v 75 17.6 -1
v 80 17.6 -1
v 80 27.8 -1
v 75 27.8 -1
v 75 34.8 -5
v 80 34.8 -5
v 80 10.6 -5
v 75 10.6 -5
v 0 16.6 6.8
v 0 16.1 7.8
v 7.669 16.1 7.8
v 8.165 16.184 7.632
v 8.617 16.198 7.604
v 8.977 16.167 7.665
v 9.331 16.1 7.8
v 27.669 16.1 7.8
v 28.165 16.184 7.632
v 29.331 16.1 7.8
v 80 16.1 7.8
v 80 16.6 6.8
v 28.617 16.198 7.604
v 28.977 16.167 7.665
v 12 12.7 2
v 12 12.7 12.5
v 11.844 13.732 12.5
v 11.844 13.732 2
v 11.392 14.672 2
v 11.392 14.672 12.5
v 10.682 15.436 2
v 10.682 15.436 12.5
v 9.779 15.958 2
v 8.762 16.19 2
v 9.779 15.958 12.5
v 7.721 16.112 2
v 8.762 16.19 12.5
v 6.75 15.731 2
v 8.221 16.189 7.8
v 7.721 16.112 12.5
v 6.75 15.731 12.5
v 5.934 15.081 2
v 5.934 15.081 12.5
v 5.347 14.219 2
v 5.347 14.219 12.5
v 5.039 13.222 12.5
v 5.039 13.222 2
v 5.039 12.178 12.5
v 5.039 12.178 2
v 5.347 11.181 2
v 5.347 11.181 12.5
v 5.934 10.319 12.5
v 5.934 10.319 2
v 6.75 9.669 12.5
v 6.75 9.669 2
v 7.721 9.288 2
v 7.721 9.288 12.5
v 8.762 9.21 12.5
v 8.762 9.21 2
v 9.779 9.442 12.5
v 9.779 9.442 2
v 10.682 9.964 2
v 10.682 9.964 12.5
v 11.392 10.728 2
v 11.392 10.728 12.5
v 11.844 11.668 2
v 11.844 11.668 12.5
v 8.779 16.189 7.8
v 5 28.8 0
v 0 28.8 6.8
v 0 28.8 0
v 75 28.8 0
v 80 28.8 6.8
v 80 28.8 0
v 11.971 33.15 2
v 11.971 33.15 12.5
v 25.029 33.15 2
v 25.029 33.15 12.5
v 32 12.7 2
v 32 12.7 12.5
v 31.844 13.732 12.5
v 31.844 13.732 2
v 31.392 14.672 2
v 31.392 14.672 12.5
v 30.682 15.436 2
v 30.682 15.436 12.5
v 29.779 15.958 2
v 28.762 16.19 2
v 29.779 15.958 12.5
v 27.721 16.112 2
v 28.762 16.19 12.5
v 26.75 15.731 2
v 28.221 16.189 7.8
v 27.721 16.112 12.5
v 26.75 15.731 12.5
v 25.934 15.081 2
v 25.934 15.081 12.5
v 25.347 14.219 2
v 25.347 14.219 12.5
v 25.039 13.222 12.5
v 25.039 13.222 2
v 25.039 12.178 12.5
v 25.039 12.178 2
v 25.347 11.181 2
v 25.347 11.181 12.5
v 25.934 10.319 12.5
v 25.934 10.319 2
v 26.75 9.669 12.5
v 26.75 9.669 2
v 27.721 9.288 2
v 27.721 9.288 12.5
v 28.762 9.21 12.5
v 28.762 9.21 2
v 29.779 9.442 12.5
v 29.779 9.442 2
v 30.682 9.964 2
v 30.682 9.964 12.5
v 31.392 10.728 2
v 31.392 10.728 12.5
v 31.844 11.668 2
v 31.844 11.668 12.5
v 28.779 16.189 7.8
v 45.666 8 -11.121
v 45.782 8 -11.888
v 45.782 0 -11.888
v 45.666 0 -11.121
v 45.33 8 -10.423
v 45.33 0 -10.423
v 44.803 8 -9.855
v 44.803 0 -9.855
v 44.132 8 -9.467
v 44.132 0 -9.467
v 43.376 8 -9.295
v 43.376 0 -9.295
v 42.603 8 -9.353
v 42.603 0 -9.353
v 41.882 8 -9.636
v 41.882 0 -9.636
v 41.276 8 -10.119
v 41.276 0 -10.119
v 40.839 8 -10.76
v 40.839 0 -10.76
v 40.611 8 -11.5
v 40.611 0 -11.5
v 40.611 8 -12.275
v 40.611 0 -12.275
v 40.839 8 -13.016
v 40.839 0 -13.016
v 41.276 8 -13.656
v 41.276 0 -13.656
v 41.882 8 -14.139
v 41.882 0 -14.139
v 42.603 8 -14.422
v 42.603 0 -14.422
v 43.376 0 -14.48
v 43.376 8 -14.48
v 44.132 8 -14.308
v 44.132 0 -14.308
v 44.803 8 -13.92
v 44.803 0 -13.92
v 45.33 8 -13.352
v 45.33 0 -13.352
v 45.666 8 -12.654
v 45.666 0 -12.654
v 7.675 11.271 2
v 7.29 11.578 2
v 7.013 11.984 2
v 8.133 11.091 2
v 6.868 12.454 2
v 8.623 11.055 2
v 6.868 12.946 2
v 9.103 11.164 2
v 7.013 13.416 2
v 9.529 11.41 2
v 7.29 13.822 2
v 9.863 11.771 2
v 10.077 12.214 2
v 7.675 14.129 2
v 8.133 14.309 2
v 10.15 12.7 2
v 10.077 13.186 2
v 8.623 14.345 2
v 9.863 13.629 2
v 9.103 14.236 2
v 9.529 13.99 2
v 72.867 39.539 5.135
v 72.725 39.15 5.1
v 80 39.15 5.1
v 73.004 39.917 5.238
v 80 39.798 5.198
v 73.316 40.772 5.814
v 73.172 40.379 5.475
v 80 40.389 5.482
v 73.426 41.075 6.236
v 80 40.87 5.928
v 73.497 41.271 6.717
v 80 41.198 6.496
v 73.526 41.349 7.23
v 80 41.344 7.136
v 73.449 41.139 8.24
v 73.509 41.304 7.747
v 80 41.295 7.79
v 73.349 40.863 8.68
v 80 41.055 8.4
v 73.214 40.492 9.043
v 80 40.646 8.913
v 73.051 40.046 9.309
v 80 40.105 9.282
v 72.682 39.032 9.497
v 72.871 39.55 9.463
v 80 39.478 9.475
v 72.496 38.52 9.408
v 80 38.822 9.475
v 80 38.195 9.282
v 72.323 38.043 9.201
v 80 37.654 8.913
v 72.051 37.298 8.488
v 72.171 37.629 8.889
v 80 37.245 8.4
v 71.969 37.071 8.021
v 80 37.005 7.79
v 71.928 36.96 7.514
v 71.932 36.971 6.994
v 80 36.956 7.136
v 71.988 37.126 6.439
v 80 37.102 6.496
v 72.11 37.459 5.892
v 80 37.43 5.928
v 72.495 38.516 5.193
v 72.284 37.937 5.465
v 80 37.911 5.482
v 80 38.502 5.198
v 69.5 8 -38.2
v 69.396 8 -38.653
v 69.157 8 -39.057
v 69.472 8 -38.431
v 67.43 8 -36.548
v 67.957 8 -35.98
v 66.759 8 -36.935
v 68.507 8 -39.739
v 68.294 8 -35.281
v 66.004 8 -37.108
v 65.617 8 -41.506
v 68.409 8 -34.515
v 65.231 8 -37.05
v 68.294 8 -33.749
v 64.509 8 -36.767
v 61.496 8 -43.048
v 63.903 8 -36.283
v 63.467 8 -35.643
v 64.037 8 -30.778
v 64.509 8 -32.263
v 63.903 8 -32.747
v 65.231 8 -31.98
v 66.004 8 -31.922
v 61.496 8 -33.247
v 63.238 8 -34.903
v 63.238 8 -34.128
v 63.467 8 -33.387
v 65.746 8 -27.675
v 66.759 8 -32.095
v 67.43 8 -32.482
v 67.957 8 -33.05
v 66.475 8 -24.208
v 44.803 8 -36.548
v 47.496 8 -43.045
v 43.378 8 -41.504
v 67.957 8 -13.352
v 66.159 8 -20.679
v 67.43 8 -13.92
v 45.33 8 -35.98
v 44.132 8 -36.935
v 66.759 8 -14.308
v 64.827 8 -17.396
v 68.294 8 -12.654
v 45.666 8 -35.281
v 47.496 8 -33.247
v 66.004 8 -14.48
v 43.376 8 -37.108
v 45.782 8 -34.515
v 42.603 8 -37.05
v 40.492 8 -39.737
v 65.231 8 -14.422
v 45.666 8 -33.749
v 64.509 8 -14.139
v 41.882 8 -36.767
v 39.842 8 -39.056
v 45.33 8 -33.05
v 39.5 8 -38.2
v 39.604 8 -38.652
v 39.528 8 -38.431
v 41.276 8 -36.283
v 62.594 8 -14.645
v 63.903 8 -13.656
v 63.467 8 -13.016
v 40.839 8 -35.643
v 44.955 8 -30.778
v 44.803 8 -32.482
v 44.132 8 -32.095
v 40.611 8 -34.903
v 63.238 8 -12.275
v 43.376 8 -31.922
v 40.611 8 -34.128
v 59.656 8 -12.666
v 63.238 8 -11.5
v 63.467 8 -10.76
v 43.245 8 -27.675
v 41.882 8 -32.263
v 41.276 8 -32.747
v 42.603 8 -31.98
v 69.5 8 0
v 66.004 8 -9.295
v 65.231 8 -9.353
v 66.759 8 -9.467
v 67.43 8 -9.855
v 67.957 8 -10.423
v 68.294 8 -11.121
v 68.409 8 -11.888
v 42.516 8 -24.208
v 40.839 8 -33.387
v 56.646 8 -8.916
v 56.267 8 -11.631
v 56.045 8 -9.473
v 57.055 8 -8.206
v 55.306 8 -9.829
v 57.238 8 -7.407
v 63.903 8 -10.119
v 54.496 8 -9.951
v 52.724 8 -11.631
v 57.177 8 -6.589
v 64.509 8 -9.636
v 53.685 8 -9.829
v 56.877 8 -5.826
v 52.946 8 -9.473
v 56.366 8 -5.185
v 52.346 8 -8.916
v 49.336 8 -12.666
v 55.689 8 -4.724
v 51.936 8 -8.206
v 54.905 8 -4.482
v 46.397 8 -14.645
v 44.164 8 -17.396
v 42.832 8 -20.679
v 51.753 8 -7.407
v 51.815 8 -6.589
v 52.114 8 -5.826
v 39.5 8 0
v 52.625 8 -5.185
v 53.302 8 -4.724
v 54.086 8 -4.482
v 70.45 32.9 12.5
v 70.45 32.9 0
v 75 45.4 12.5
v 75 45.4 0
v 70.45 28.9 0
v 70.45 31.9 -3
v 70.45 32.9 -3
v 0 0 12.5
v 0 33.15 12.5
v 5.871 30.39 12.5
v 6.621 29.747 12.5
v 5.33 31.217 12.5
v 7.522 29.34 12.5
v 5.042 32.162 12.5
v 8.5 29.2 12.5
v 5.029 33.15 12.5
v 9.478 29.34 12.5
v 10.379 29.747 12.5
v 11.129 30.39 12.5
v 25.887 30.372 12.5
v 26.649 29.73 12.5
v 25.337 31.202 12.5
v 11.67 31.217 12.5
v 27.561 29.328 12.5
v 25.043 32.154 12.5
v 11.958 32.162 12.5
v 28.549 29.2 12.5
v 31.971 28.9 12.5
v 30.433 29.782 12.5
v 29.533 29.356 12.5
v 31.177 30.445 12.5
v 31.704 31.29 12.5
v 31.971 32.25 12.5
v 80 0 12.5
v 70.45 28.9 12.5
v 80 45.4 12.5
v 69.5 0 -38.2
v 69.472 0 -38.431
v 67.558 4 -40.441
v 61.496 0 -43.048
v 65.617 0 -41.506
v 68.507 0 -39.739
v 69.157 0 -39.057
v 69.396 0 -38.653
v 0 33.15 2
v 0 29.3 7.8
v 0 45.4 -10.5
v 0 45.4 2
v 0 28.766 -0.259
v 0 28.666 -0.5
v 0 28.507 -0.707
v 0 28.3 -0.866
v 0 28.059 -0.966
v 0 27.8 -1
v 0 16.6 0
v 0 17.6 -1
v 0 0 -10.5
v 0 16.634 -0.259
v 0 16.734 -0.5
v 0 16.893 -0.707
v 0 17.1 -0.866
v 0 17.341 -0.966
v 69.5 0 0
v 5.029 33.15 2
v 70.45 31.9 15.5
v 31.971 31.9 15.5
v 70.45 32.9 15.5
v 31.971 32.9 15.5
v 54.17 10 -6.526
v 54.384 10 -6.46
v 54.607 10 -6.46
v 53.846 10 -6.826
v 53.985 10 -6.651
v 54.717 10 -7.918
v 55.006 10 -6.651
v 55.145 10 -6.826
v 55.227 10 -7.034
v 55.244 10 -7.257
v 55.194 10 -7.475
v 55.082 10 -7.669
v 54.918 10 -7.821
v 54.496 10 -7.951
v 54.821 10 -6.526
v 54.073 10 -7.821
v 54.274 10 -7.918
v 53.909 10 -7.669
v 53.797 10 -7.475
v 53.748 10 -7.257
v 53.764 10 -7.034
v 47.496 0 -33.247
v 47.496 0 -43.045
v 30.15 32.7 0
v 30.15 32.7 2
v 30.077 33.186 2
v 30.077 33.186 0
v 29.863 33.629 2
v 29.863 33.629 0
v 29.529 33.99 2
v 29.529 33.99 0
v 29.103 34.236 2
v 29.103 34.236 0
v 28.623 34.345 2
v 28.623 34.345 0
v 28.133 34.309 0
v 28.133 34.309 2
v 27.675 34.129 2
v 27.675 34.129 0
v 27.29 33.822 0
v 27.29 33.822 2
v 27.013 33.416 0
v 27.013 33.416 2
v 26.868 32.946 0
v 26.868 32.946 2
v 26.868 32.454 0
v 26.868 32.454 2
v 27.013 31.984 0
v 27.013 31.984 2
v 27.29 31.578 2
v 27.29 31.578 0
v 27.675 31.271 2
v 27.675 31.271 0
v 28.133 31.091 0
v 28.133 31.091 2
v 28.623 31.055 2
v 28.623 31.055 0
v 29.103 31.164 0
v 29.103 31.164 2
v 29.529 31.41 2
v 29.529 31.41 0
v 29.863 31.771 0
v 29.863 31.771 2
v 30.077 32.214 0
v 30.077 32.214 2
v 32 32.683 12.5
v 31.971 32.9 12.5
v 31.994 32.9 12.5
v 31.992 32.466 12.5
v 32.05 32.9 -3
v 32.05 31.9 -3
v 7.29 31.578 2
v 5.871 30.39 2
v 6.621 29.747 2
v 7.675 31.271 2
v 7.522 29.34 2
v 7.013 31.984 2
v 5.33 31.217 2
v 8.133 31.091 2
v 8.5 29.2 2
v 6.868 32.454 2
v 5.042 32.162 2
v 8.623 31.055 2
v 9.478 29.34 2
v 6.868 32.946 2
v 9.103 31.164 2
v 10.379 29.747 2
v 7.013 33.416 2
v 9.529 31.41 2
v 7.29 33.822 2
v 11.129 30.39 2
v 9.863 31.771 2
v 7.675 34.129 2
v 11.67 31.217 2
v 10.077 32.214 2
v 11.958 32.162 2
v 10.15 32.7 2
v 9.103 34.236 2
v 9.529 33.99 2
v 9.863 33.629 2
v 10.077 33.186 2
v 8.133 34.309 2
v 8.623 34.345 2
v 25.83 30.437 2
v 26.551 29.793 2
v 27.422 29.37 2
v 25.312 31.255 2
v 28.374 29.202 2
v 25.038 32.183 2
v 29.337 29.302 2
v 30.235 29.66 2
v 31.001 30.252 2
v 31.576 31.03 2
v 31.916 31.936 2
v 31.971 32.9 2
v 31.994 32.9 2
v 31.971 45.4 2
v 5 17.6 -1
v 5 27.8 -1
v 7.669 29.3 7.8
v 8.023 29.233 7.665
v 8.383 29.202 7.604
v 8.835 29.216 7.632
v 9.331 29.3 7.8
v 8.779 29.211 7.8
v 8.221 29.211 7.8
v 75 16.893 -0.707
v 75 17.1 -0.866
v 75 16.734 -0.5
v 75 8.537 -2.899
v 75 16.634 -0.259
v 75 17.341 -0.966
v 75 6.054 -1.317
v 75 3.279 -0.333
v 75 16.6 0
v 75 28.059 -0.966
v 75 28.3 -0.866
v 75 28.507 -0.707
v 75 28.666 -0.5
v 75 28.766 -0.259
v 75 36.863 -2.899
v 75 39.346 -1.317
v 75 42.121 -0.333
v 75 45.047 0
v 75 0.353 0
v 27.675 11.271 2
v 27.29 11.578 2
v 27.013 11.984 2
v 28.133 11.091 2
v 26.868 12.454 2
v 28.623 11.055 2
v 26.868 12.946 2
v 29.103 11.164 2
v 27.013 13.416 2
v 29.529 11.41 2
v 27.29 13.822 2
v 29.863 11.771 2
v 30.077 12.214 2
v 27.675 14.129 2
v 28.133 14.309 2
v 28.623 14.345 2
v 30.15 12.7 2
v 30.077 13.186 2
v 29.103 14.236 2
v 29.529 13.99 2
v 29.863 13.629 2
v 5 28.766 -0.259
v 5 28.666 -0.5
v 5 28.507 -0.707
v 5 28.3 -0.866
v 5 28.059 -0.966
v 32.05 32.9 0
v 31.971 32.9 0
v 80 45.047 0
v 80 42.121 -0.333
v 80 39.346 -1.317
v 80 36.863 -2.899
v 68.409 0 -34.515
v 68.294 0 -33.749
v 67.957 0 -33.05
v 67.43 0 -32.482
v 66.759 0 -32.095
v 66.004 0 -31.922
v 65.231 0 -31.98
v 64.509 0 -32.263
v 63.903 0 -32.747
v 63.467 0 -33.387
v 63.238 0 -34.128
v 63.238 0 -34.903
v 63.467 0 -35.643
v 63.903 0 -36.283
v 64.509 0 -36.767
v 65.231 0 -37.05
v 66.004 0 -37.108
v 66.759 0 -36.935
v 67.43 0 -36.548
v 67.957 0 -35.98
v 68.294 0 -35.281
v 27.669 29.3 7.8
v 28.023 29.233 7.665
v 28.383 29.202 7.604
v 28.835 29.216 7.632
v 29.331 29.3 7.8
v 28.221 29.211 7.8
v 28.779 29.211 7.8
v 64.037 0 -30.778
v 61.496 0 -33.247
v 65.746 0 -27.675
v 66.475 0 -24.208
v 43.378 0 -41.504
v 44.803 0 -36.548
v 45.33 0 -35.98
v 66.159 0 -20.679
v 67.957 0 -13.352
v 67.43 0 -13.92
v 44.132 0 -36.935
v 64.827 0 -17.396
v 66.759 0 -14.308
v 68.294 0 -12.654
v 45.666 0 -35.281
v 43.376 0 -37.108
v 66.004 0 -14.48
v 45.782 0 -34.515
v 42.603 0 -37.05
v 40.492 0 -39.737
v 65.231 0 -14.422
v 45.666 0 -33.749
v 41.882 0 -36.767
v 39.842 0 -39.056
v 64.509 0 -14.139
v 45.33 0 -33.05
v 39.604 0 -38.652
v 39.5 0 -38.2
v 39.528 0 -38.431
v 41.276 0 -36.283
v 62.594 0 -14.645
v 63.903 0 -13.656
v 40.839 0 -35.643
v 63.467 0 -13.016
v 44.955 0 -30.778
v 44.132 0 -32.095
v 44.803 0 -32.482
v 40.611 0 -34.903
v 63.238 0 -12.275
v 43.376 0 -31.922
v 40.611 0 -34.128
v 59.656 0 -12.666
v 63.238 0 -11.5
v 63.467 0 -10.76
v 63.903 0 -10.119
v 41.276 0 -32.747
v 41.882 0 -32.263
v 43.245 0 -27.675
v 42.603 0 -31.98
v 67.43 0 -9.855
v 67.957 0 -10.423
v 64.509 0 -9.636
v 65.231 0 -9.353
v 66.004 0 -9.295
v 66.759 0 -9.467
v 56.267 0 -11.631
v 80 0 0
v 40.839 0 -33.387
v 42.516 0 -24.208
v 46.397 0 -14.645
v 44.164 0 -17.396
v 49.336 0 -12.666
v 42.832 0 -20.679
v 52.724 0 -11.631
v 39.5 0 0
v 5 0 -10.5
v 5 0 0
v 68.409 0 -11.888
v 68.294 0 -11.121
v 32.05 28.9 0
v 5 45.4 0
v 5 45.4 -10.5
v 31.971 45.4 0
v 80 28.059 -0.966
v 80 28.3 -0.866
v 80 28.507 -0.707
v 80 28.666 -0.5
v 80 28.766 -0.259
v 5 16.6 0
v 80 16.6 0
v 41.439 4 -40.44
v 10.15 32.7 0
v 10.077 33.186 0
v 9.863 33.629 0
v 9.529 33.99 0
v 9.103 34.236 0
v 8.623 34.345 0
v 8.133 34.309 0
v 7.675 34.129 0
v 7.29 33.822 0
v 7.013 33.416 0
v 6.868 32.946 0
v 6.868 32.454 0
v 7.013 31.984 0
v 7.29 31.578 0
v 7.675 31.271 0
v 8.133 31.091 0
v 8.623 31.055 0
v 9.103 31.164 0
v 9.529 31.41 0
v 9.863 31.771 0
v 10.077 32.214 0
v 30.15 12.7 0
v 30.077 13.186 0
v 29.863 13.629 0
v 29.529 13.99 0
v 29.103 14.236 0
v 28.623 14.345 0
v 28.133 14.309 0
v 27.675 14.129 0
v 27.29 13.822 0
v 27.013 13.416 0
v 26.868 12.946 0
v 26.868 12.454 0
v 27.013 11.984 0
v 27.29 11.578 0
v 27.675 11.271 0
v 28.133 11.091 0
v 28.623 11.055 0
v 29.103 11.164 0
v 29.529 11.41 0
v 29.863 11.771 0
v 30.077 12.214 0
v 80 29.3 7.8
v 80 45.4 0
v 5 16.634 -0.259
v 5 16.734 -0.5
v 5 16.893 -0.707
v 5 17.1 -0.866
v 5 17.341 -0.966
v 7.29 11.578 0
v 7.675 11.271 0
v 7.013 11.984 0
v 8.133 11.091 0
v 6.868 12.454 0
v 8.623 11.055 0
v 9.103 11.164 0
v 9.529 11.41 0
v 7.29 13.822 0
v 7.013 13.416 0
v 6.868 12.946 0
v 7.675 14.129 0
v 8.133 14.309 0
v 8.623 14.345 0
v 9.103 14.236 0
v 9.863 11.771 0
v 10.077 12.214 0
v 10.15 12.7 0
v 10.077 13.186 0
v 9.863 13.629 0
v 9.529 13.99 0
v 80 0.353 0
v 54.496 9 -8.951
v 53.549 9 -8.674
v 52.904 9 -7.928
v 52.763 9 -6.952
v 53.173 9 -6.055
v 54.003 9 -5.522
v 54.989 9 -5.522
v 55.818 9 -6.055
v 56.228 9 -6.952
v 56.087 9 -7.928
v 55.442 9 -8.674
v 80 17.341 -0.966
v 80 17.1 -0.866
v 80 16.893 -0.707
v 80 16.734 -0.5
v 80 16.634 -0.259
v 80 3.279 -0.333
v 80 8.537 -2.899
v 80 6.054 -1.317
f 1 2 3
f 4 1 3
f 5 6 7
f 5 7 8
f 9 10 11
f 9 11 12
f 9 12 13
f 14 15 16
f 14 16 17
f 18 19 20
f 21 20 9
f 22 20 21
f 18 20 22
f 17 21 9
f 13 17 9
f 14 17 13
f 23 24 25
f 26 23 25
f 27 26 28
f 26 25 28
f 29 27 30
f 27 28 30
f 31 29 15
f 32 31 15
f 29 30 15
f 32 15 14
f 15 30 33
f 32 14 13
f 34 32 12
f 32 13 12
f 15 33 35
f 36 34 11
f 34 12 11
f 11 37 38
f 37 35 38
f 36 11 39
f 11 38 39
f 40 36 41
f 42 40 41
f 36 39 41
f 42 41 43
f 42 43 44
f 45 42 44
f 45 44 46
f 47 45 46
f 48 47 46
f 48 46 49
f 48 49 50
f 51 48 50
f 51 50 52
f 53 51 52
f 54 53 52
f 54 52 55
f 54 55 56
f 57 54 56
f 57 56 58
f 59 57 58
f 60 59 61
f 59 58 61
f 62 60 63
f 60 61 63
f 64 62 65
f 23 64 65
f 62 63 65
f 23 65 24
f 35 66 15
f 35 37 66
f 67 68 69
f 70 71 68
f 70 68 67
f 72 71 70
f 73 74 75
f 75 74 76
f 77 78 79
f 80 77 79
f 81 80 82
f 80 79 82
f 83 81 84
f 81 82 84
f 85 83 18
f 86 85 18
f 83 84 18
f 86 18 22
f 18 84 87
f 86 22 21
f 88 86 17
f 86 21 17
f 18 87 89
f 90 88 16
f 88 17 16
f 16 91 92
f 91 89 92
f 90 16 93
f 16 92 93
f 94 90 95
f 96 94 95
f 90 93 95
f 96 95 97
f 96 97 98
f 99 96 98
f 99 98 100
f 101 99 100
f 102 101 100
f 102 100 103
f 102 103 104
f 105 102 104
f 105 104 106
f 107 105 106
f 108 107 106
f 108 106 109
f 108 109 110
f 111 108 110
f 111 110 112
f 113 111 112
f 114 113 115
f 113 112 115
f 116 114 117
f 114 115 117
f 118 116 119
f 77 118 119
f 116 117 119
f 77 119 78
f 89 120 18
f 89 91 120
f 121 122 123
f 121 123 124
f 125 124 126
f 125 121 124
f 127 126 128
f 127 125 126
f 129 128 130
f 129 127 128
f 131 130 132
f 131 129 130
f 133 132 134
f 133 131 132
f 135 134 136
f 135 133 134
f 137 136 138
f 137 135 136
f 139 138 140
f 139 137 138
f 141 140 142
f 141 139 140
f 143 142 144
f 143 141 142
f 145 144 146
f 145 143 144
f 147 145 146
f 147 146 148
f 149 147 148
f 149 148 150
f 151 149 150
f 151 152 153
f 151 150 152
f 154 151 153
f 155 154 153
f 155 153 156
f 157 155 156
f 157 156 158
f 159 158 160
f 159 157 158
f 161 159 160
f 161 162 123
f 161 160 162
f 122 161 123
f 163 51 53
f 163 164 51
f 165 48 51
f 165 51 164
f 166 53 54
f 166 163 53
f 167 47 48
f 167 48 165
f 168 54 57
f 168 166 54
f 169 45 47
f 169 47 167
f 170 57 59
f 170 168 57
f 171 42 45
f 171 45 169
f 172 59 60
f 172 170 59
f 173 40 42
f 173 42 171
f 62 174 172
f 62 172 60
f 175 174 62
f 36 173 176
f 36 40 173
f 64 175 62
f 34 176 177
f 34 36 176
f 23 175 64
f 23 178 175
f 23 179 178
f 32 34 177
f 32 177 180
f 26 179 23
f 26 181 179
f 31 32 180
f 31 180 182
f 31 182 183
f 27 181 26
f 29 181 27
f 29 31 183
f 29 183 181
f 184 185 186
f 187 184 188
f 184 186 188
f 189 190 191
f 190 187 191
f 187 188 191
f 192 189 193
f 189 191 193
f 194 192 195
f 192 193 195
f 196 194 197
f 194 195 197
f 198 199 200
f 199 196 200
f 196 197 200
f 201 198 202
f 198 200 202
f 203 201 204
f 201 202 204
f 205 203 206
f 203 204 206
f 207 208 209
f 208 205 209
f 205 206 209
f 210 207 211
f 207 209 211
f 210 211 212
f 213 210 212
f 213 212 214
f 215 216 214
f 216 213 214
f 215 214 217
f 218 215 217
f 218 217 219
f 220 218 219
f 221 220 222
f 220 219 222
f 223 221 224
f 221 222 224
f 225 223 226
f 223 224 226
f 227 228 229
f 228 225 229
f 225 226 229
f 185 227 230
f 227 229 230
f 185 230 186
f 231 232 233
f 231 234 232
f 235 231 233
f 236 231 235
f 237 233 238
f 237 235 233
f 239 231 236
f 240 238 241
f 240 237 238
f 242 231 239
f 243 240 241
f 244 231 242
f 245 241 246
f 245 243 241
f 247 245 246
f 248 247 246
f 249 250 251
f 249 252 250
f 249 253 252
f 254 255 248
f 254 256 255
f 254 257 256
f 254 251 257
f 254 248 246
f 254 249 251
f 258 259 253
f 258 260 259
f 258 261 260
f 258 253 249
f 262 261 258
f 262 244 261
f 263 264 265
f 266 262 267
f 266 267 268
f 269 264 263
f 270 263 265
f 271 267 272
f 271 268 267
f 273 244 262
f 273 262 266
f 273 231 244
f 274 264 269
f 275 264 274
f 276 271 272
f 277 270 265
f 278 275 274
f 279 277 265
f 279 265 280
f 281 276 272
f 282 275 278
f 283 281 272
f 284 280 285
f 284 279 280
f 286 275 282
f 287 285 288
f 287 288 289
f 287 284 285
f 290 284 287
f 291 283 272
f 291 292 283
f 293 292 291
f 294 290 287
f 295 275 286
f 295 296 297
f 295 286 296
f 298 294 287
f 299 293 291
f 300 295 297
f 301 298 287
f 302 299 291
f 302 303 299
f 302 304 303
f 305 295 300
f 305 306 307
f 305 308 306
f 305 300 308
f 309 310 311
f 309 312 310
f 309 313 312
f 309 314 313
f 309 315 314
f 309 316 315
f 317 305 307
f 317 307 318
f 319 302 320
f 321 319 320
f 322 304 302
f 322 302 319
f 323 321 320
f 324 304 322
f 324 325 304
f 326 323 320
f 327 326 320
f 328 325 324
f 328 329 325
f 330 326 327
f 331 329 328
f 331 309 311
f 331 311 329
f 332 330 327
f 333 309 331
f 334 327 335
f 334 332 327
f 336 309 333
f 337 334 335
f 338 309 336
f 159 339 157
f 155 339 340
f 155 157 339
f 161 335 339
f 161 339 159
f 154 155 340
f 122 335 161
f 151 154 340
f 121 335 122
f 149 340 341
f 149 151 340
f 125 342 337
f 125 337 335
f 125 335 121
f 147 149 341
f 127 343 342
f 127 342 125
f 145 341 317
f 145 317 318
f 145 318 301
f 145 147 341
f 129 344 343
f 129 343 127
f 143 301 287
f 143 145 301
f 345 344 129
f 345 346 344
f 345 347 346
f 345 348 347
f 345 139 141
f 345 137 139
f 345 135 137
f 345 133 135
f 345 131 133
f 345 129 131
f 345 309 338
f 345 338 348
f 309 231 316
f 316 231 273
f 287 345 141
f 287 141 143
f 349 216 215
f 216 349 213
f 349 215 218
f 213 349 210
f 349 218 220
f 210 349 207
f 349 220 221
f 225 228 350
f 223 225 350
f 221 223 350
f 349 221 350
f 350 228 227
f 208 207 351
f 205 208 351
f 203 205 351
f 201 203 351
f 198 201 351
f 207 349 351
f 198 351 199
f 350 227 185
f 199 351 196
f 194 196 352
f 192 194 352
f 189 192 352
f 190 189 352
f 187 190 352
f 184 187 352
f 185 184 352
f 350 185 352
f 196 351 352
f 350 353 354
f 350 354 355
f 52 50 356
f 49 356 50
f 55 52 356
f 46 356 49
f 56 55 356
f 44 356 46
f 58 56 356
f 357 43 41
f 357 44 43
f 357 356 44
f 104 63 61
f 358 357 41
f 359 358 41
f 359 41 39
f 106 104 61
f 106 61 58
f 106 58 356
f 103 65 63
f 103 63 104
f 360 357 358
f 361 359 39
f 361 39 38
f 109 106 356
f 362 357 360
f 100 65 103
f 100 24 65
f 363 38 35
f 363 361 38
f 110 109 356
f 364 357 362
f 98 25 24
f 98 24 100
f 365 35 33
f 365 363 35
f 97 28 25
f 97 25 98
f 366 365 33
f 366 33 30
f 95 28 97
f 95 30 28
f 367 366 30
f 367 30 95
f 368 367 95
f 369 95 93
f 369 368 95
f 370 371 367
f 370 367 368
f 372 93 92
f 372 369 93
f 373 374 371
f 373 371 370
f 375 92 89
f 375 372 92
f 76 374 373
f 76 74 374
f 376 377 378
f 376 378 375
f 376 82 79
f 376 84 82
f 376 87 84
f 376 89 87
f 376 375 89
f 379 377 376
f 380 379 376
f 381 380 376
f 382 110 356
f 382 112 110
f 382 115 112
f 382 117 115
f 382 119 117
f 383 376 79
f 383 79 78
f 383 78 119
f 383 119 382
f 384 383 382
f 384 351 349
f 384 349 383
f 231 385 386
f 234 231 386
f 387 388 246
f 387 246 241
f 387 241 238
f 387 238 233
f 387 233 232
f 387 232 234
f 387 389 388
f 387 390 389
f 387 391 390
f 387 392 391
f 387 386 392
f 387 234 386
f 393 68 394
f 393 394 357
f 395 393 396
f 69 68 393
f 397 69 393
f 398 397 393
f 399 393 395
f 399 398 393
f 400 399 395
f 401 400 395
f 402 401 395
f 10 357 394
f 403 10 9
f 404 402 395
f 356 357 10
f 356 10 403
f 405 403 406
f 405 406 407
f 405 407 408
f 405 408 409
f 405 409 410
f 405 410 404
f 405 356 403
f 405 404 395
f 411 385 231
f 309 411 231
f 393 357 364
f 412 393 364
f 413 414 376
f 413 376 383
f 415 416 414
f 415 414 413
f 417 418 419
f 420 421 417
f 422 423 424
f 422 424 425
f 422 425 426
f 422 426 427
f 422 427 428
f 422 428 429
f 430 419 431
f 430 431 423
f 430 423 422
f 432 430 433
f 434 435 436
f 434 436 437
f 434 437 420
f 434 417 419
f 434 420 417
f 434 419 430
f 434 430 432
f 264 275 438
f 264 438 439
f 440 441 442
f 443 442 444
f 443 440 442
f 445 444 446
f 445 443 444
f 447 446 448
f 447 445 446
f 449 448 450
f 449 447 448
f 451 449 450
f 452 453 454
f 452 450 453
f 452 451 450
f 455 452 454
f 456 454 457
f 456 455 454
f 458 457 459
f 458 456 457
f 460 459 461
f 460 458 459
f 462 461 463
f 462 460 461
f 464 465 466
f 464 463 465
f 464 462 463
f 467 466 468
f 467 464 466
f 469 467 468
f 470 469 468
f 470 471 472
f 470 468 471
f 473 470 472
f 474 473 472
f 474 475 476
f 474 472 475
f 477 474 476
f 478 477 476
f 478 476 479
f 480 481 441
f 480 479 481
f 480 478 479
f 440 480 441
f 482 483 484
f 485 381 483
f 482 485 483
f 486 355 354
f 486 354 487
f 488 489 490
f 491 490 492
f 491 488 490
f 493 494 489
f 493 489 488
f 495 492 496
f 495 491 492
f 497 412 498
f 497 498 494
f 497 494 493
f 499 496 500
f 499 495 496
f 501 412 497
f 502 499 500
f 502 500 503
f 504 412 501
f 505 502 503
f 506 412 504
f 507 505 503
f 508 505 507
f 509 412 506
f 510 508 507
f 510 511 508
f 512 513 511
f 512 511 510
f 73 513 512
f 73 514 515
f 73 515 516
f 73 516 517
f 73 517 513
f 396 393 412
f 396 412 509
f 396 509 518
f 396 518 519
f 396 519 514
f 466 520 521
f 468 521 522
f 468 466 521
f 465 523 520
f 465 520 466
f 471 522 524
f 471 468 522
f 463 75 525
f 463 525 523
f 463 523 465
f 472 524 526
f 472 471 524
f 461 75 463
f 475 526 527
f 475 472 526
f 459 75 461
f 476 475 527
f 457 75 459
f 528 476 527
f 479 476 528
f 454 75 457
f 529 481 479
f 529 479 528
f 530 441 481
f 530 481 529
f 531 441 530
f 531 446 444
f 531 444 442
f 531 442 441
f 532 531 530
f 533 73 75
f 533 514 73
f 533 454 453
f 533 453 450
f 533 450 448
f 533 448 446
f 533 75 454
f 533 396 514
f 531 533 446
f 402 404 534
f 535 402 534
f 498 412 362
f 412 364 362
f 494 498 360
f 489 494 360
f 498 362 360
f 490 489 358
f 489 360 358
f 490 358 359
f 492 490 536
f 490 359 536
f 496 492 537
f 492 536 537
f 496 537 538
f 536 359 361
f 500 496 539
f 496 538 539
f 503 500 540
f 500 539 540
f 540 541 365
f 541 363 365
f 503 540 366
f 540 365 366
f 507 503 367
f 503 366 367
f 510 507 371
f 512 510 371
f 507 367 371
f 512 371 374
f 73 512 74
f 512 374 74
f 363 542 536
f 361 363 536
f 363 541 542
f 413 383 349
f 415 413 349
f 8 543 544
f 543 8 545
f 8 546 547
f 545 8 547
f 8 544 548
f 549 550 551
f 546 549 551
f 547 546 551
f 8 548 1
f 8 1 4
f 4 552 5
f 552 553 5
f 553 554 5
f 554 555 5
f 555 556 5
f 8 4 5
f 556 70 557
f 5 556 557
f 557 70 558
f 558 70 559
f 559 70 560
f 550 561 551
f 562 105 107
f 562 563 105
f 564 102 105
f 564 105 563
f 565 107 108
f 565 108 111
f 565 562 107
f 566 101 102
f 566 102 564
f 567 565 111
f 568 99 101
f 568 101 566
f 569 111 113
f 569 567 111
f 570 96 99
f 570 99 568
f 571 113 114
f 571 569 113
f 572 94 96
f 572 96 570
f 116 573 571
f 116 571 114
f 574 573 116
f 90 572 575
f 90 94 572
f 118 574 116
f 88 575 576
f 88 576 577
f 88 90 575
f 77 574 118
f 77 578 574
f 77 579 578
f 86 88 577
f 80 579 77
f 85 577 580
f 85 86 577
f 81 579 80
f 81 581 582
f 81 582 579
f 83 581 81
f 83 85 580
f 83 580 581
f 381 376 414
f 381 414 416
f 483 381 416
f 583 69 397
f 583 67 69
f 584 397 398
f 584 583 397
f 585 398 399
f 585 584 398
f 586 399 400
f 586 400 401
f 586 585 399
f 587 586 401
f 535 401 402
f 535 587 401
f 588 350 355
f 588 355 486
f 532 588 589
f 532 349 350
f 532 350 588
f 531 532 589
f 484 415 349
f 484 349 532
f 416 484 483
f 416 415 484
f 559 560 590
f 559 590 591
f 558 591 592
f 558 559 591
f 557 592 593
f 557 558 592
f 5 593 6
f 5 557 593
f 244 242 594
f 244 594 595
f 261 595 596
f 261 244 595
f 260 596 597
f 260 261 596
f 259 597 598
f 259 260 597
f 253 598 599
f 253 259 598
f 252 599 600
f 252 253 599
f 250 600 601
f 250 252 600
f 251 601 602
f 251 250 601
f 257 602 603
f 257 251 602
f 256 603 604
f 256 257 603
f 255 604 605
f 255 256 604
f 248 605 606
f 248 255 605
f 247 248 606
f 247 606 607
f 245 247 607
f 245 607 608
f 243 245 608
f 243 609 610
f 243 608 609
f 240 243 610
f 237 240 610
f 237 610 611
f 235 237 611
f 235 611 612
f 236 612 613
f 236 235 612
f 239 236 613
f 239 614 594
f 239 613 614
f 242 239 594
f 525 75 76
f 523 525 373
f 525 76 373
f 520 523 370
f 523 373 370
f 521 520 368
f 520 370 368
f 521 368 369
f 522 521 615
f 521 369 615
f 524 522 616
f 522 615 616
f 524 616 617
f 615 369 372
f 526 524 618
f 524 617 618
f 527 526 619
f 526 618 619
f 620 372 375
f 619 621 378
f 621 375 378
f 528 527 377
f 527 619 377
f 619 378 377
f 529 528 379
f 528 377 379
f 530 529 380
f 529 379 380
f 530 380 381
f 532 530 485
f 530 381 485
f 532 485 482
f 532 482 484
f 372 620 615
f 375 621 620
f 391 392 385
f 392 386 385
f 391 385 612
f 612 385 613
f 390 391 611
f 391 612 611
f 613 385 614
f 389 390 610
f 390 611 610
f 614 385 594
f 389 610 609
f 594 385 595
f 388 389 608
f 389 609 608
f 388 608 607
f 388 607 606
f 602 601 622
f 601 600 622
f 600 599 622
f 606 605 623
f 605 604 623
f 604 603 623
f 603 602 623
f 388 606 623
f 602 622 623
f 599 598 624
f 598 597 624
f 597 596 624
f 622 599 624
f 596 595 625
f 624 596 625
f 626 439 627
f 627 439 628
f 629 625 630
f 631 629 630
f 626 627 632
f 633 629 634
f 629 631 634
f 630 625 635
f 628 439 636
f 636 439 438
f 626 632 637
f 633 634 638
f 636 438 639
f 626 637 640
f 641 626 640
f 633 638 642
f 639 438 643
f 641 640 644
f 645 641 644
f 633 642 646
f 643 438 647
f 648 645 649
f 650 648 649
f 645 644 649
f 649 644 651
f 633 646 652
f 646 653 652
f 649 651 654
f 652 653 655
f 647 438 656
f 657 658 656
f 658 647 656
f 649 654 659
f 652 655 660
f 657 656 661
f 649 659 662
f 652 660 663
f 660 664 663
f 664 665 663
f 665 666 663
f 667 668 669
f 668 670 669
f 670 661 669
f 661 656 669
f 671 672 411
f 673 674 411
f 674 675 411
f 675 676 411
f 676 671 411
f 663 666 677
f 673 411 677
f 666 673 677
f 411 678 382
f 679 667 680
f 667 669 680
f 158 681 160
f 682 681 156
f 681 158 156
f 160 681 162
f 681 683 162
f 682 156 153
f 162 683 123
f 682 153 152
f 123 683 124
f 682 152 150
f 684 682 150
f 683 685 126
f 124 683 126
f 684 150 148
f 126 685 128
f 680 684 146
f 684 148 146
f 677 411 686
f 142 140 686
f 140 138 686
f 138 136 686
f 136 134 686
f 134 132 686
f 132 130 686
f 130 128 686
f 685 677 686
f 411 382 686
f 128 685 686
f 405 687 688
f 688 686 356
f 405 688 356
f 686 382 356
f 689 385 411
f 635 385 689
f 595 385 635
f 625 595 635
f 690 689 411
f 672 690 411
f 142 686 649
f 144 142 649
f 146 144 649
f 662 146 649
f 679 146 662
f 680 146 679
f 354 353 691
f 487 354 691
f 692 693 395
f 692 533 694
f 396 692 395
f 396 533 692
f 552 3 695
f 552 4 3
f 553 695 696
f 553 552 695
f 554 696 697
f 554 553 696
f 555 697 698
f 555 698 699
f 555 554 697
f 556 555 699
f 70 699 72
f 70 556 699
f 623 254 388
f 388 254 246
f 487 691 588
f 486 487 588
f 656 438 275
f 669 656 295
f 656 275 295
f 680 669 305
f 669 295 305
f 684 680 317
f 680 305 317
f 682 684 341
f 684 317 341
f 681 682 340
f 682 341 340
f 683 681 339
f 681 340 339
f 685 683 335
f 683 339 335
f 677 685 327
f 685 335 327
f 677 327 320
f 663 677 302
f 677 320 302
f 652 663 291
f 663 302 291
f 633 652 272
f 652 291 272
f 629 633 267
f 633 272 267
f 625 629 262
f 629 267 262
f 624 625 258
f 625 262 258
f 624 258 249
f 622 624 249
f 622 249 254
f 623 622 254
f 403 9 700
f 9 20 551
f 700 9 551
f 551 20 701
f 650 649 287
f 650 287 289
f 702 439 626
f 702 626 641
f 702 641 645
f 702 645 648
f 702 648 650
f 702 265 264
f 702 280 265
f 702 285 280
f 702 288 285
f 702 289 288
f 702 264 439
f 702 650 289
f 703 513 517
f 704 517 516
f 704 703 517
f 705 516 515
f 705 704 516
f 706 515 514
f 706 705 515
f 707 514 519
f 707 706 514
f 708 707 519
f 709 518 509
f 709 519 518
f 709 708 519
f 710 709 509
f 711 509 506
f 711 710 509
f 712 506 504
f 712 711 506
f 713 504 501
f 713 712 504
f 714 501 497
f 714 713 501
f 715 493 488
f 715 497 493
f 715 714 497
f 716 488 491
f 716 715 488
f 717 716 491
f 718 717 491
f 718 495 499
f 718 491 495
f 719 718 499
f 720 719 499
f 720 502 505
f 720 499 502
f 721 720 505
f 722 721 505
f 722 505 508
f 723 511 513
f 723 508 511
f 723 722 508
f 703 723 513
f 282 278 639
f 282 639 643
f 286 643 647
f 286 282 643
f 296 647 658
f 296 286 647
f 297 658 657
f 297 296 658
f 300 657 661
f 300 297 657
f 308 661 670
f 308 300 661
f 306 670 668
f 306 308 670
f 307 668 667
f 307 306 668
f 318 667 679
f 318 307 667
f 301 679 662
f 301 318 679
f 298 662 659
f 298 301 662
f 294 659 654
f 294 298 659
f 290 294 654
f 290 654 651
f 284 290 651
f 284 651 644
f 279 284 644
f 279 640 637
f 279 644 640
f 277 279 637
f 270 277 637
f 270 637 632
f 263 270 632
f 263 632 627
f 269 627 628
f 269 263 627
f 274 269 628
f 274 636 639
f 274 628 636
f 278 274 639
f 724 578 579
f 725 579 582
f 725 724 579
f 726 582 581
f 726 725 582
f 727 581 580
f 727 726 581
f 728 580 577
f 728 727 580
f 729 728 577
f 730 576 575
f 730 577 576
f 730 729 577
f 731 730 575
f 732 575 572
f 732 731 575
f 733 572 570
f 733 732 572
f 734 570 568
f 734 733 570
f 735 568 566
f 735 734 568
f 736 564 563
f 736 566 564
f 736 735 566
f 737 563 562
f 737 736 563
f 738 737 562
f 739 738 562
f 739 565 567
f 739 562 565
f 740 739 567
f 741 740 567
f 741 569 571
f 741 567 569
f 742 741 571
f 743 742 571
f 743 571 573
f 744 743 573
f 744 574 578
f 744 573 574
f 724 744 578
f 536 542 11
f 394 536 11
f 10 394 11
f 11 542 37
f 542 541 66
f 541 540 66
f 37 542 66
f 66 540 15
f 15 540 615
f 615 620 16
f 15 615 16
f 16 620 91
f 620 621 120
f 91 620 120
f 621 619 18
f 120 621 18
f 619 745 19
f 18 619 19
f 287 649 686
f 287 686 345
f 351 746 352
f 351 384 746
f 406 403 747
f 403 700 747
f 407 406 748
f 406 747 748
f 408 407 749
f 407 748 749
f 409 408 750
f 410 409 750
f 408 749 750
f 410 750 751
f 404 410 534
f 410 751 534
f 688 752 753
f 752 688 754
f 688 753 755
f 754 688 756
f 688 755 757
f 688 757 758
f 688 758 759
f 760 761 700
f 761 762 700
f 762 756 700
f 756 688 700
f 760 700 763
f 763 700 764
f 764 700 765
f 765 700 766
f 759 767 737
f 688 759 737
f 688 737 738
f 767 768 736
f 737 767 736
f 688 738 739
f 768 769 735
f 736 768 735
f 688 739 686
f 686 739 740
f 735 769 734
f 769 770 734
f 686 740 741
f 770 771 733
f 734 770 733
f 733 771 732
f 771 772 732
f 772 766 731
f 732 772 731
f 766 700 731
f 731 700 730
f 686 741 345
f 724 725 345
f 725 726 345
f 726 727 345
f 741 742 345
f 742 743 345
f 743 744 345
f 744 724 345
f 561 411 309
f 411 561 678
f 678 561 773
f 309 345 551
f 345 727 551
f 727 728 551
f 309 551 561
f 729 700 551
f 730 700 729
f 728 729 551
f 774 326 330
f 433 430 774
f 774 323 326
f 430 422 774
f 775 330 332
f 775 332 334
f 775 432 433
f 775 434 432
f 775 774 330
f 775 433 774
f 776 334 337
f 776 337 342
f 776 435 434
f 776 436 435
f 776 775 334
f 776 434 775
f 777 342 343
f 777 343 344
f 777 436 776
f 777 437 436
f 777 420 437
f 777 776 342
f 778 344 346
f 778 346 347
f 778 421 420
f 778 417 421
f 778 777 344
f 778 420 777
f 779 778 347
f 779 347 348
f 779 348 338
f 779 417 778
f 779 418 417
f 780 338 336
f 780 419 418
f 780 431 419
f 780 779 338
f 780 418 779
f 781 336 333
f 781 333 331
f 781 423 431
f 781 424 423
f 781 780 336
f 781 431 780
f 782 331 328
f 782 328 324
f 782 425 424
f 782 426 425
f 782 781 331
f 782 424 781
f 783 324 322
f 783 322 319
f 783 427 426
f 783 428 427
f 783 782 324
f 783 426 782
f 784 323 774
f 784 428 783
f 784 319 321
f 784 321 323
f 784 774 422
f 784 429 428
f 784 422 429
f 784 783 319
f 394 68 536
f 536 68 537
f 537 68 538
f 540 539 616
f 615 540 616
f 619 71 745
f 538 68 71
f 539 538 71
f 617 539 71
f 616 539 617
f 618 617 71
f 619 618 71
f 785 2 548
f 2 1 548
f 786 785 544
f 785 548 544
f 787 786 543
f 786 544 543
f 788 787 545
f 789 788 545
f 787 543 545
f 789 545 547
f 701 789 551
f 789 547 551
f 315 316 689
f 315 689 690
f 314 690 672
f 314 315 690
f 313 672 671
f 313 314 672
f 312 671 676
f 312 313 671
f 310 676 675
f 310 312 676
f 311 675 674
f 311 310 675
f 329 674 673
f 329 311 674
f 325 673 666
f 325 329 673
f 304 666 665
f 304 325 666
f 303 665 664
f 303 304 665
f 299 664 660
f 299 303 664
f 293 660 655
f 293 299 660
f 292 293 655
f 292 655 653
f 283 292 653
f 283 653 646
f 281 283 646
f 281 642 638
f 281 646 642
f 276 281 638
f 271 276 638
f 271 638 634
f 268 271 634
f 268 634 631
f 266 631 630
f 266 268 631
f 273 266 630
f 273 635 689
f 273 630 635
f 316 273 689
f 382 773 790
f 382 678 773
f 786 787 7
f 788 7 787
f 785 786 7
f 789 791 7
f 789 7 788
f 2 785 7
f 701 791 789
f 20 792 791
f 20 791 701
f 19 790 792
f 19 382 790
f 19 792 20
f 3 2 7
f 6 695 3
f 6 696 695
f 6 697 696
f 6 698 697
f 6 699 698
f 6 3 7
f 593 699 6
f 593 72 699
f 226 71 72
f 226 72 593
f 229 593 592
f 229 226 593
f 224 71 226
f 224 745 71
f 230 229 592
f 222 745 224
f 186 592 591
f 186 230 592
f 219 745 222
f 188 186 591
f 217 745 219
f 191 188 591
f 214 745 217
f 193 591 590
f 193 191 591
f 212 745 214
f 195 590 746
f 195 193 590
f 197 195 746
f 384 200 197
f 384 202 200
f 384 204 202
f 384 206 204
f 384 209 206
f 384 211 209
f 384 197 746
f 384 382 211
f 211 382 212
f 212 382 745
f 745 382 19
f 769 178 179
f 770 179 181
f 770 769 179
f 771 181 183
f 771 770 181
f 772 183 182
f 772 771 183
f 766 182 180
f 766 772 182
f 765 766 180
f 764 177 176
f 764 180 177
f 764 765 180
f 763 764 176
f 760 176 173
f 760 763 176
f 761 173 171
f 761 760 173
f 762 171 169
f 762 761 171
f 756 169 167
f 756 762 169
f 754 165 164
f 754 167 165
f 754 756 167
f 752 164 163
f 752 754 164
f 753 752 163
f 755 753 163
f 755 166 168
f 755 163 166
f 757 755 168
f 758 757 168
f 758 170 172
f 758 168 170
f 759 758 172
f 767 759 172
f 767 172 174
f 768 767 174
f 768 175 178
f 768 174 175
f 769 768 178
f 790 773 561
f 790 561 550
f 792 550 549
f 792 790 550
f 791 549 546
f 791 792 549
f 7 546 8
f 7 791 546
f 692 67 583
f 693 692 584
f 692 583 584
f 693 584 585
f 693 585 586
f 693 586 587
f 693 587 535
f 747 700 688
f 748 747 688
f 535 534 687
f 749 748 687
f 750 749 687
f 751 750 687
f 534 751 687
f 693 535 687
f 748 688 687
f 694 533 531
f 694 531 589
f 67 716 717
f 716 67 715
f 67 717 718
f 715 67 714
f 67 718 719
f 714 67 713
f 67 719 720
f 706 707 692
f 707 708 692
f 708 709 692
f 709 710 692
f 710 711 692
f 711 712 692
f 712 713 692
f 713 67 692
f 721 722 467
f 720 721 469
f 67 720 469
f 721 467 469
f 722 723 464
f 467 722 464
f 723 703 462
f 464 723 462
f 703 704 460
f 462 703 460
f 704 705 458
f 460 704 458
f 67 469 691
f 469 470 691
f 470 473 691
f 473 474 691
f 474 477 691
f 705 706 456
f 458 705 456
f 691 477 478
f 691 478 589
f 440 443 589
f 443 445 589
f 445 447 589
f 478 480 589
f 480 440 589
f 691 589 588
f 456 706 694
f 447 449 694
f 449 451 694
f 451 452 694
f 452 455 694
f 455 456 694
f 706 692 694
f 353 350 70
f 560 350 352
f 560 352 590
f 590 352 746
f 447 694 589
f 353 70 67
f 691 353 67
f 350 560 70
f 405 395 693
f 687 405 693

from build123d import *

# Parameters (mm, degrees)
SKETCH1_W               = 80
SKETCH1_H               = 45.4
SKETCH1_R               = 1.65
BOSS_EXTRUDE1_DEPTH     = 12.5
SKETCH2_W               = 5
SKETCH2_H               = 45.4
BOSS_EXTRUDE2_DEPTH     = 10.5
CUT_EXTRUDE1_DEPTH      = 7.8
CUT_EXTRUDE1_DEPTH_BACK = 93.830005925
SKETCH3_W               = 80
SKETCH3_H               = 12.2
SKETCH4_W               = 30
SKETCH4_H               = 8
BOSS_EXTRUDE3_DEPTH     = 44.2
SKETCH5_R               = 12
CUT_EXTRUDE2_DEPTH      = 45
CUT_EXTRUDE3_DEPTH      = 96.828388278
CUT_EXTRUDE3_DEPTH_BACK = 96.828388278
SKETCH6_R               = 2.6
FILLET1_SIZE            = 6
FILLET1_SIZE_2          = 15
SKETCH8_R               = 3.5
CUT_EXTRUDE5_DEPTH      = 10.5
SKETCH12_W              = 45
SKETCH12_H              = 12.25
CUT_EXTRUDE8_DEPTH      = 10.5
SKETCH13_W              = 14
SKETCH13_H              = 23.274164218
CUT_EXTRUDE10_DEPTH     = 10
SKETCH15_R              = 2.75
BOSS_EXTRUDE6_DEPTH     = 2
SKETCH16_W              = 43.029059925
SKETCH16_H              = 12.5
CUT_EXTRUDE11_DEPTH     = 12.5
CHAMFER2_SIZE2          = 12.5
CHAMFER2_SIZE           = 4.549627928
SKETCH17_R              = 2.2
CUT_EXTRUDE12_DEPTH     = 10
CUT_EXTRUDE13_DEPTH     = 102.559280367
SKETCH19_W              = 5
SKETCH19_H              = 24.2
BOSS_EXTRUDE7_DEPTH     = 5
SKETCH20_W              = 1
SKETCH20_H              = 12.2
CUT_EXTRUDE14_DEPTH     = 102.559280367
SKETCH21_W              = 5
SKETCH21_H              = 9.5
BOSS_EXTRUDE8_DEPTH     = 12.2
FILLET2_R               = 1
FILLET3_R               = 13
CHAMFER1_SIZE           = 2
SKETCH22_W              = 38.479431997
SKETCH22_H              = 1
BOSS_EXTRUDE9_DEPTH     = 3
SKETCH23_W              = 38.4
SKETCH23_H              = 1
BOSS_EXTRUDE10_DEPTH    = 3
CHAMFER3_SIZE           = 3


# Some blends are built 0.0001 mm under size
with BuildPart() as part:
    # Sketch1 → Boss-Extrude1 (new body)
    with BuildSketch(Plane.XY):
        with Locations((40, 22.7)):
            Rectangle(SKETCH1_W, SKETCH1_H)
        with Locations((8.499989197, 32.7)):
            Circle(SKETCH1_R, mode=Mode.SUBTRACT)
        with Locations((28.499989197, 32.7)):
            Circle(SKETCH1_R, mode=Mode.SUBTRACT)
        with Locations((28.499989197, 12.7)):
            Circle(SKETCH1_R, mode=Mode.SUBTRACT)
        with Locations((8.499989197, 12.7)):
            Circle(SKETCH1_R, mode=Mode.SUBTRACT)
    extrude(amount=BOSS_EXTRUDE1_DEPTH)

    # Sketch2 → Boss-Extrude2 (add)
    with BuildSketch(Plane(origin=(0, 0, 0), x_dir=(-1, 0, 0), z_dir=(0, 0, -1))):
        with Locations((-2.5, 22.7)):
            Rectangle(SKETCH2_W, SKETCH2_H)
    extrude(amount=BOSS_EXTRUDE2_DEPTH)

    # Sketch3 → Cut-Extrude1 (cut, two sides: drawn at the far end of the back side and taken through both)
    with BuildSketch(Plane.XY.offset(-CUT_EXTRUDE1_DEPTH_BACK)):
        with Locations((40, 22.7)):
            Rectangle(SKETCH3_W, SKETCH3_H)
    extrude(amount=CUT_EXTRUDE1_DEPTH + CUT_EXTRUDE1_DEPTH_BACK, mode=Mode.SUBTRACT)

    # Sketch4 → Boss-Extrude3 (add)
    with BuildSketch(Plane(origin=(0, 0, 0), x_dir=(-1, 0, 0), z_dir=(0, 0, -1))):
        with Locations((-54.5, 4)):
            Rectangle(SKETCH4_W, SKETCH4_H)
    extrude(amount=BOSS_EXTRUDE3_DEPTH)

    # Sketch5 → Cut-Extrude2 (cut)
    with BuildSketch(Plane(origin=(0, 8, 0), x_dir=(1, 0, 0), z_dir=(0, 1, 0))):
        with Locations(Location((54.495569327, 23.5, 0), (0, 0, 270))):
            Circle(SKETCH5_R)
    extrude(amount=-CUT_EXTRUDE2_DEPTH, mode=Mode.SUBTRACT)

    # Sketch6 → Cut-Extrude3 (cut, two sides: drawn at the far end of the back side and taken through both)
    with BuildSketch(Plane.XZ.offset(-16.6).offset(-CUT_EXTRUDE3_DEPTH_BACK)):
        with Locations((54.495569327, -39.201340104)):
            Circle(SKETCH6_R)
        with Locations((65.809277826, -34.515048603)):
            Circle(SKETCH6_R)
        with Locations((43.181860828, -34.515048603)):
            Circle(SKETCH6_R)
        with Locations((43.181860828, -11.887631605)):
            Circle(SKETCH6_R)
        with Locations((65.809277826, -11.887631605)):
            Circle(SKETCH6_R)
    extrude(amount=CUT_EXTRUDE3_DEPTH + CUT_EXTRUDE3_DEPTH_BACK, mode=Mode.SUBTRACT)

    # Fillet1
    # a fillet whose section is not a circle: 15, 6 mm, written as the material it takes off along each edge
    with BuildSketch(Plane(origin=(39.5, -37.5, -44.2), x_dir=(0, 0, 1), z_dir=(0, 1, 0)), Plane(origin=(69.5, 45.5, -44.2), x_dir=(0, 0, 1), z_dir=(0, -1, 0))) as fillet1_piece_1:
        with BuildLine():
            Bezier((FILLET1_SIZE, 0), (0, 0), (0, FILLET1_SIZE_2), weights=[1, 0.428571429, 1])
            Line((0, FILLET1_SIZE_2), (0, 0))
            Line((0, 0), (FILLET1_SIZE, 0))
        make_face()
    extrude(amount=83, mode=Mode.SUBTRACT)

    # Sketch8 → Cut-Extrude5 (cut)
    with BuildSketch(Plane.XY.offset(12.5)):
        with Locations((8.499989197, 32.7)):
            Circle(SKETCH8_R)
        with Locations((28.499989197, 32.7)):
            Circle(SKETCH8_R)
        with Locations((8.499989197, 12.7)):
            Circle(SKETCH8_R)
        with Locations((28.499989197, 12.7)):
            Circle(SKETCH8_R)
    extrude(amount=-CUT_EXTRUDE5_DEPTH, mode=Mode.SUBTRACT)

    # Sketch12 → Cut-Extrude8 (cut)
    with BuildSketch(Plane.XY.offset(12.5)):
        with Locations((22.5, 39.275)):
            Rectangle(SKETCH12_W, SKETCH12_H)
    extrude(amount=-CUT_EXTRUDE8_DEPTH, mode=Mode.SUBTRACT)

    # Sketch13 → Cut-Extrude10 (cut)
    with BuildSketch(Plane(origin=(0, 8, 0), x_dir=(1, 0, 0), z_dir=(0, 1, 0))):
        with Locations((54.495569327, 39.201340104)):
            Rectangle(SKETCH13_W, SKETCH13_H)
    extrude(amount=-CUT_EXTRUDE10_DEPTH, mode=Mode.SUBTRACT)

    # Sketch15 → Boss-Extrude6 (add)
    with BuildSketch(Plane(origin=(0, 8, 0), x_dir=(1, 0, 0), z_dir=(0, 1, 0))):
        with Locations(Location((54.495569327, 7.201340104, 0), (0, 0, 90))):
            Circle(SKETCH15_R)
    extrude(amount=BOSS_EXTRUDE6_DEPTH)

    # Sketch16 → Cut-Extrude11 (cut)
    with BuildSketch(Plane(origin=(0, 45.4, 0), x_dir=(1, 0, 0), z_dir=(0, 1, 0))):
        with Locations((53.485470038, -6.25)):
            Rectangle(SKETCH16_W, SKETCH16_H)
    extrude(amount=-CUT_EXTRUDE11_DEPTH, mode=Mode.SUBTRACT)

    # Chamfer2
    chamfer2_edges = [part.edges().sort_by_distance(p)[0] for p in [
        (75, 32.9, 6.25),
    ]]
    chamfer2_side = [part.faces().sort_by_distance(p)[0] for p in [
        (74.909007441, 32.9, 6.25),
    ]]
    chamfer(chamfer2_edges, length=CHAMFER2_SIZE - 0.0001, length2=CHAMFER2_SIZE2 - 0.0001, reference=chamfer2_side[0])  # a hair under: the kernel refuses the full size

    # Sketch17 → Cut-Extrude12 (cut)
    with BuildSketch(Plane(origin=(80, 0, 0), x_dir=(0, 0, -1), z_dir=(1, 0, 0))):
        with Locations((-7.3, 39.15)):
            Circle(SKETCH17_R)
    extrude(amount=-CUT_EXTRUDE12_DEPTH, mode=Mode.SUBTRACT)

    # Sketch18 → Cut-Extrude13 (cut, through all)
    with BuildSketch(Plane(origin=(80, 0, 0), x_dir=(0, 0, -1), z_dir=(1, 0, 0))):
        Polygon((-7.8, 28.8), (-6.8, 28.8), (-7.8, 29.3), align=None)
        Polygon((-7.8, 16.6), (-7.8, 16.1), (-6.8, 16.6), align=None)
    extrude(amount=-CUT_EXTRUDE13_DEPTH, mode=Mode.SUBTRACT)

    # Sketch19 → Boss-Extrude7 (add)
    with BuildSketch(Plane(origin=(0, 0, 0), x_dir=(-1, 0, 0), z_dir=(0, 0, -1))):
        with Locations((-77.5, 22.7)):
            Rectangle(SKETCH19_W, SKETCH19_H)
    extrude(amount=BOSS_EXTRUDE7_DEPTH)

    # Sketch20 → Cut-Extrude14 (cut, through all)
    with BuildSketch(Plane(origin=(80, 0, 0), x_dir=(0, 0, -1), z_dir=(1, 0, 0))):
        with Locations((0.5, 22.7)):
            Rectangle(SKETCH20_W, SKETCH20_H)
    extrude(amount=-CUT_EXTRUDE14_DEPTH, mode=Mode.SUBTRACT)

    # Sketch21 → Boss-Extrude8 (add)
    with BuildSketch(Plane(origin=(0, 16.6, 0), x_dir=(1, 0, 0), z_dir=(0, 1, 0))):
        with Locations((2.5, 5.75)):
            Rectangle(SKETCH21_W, SKETCH21_H)
    extrude(amount=BOSS_EXTRUDE8_DEPTH)

    # Fillet2
    fillet2_edges = [part.edges().sort_by_distance(p)[0] for p in [
        (77.5, 16.6, -1),
        (77.5, 28.8, -1),
        (2.5, 16.6, -1),
        (2.5, 28.8, -1),
    ]]
    fillet(fillet2_edges, radius=FILLET2_R)

    # Fillet3
    # the kernel refuses this fillet: 13 mm, written as the material it adds along each edge
    with BuildSketch(Plane(origin=(80, 10.6, 0), x_dir=(0, -1, 0), z_dir=(-1, 0, 0)), Plane(origin=(75, 34.8, 0), x_dir=(0, 1, 0), z_dir=(1, 0, 0))) as fillet3_piece_1:
        with BuildLine():
            CenterArc((10.246950766, -13), FILLET3_R, 90, 52.020127555)
            Line((0, -5), (0, 0))
            Line((0, 0), (10.246950766, 0))
        make_face()
    extrude(amount=5)

    # Chamfer1
    chamfer1_edges = [part.edges().sort_by_distance(p)[0] for p in [
        (54.495569327, 10, -4.451340104),
    ]]
    chamfer(chamfer1_edges, length=CHAMFER1_SIZE - 0.0001)  # a hair under: the kernel refuses the full size

    # Sketch22 → Boss-Extrude9 (add)
    with BuildSketch(Plane.XY.offset(12.5)):
        with Locations((51.210656074, 32.4)):
            Rectangle(SKETCH22_W, SKETCH22_H)
    extrude(amount=BOSS_EXTRUDE9_DEPTH)

    # Sketch23 → Boss-Extrude10 (add)
    with BuildSketch(Plane(origin=(0, 0, 0), x_dir=(-1, 0, 0), z_dir=(0, 0, -1))):
        with Locations((-51.250372072, 32.4)):
            Rectangle(SKETCH23_W, SKETCH23_H)
    extrude(amount=BOSS_EXTRUDE10_DEPTH)

    # Chamfer3
    chamfer3_edges = [part.edges().sort_by_distance(p)[0] for p in [
        (51.210656074, 31.9, 12.5),
        (51.250372072, 31.9, 0),
    ]]
    chamfer(chamfer3_edges, length=CHAMFER3_SIZE - 0.0001)  # a hair under: the kernel refuses the full size


solid = part.part
